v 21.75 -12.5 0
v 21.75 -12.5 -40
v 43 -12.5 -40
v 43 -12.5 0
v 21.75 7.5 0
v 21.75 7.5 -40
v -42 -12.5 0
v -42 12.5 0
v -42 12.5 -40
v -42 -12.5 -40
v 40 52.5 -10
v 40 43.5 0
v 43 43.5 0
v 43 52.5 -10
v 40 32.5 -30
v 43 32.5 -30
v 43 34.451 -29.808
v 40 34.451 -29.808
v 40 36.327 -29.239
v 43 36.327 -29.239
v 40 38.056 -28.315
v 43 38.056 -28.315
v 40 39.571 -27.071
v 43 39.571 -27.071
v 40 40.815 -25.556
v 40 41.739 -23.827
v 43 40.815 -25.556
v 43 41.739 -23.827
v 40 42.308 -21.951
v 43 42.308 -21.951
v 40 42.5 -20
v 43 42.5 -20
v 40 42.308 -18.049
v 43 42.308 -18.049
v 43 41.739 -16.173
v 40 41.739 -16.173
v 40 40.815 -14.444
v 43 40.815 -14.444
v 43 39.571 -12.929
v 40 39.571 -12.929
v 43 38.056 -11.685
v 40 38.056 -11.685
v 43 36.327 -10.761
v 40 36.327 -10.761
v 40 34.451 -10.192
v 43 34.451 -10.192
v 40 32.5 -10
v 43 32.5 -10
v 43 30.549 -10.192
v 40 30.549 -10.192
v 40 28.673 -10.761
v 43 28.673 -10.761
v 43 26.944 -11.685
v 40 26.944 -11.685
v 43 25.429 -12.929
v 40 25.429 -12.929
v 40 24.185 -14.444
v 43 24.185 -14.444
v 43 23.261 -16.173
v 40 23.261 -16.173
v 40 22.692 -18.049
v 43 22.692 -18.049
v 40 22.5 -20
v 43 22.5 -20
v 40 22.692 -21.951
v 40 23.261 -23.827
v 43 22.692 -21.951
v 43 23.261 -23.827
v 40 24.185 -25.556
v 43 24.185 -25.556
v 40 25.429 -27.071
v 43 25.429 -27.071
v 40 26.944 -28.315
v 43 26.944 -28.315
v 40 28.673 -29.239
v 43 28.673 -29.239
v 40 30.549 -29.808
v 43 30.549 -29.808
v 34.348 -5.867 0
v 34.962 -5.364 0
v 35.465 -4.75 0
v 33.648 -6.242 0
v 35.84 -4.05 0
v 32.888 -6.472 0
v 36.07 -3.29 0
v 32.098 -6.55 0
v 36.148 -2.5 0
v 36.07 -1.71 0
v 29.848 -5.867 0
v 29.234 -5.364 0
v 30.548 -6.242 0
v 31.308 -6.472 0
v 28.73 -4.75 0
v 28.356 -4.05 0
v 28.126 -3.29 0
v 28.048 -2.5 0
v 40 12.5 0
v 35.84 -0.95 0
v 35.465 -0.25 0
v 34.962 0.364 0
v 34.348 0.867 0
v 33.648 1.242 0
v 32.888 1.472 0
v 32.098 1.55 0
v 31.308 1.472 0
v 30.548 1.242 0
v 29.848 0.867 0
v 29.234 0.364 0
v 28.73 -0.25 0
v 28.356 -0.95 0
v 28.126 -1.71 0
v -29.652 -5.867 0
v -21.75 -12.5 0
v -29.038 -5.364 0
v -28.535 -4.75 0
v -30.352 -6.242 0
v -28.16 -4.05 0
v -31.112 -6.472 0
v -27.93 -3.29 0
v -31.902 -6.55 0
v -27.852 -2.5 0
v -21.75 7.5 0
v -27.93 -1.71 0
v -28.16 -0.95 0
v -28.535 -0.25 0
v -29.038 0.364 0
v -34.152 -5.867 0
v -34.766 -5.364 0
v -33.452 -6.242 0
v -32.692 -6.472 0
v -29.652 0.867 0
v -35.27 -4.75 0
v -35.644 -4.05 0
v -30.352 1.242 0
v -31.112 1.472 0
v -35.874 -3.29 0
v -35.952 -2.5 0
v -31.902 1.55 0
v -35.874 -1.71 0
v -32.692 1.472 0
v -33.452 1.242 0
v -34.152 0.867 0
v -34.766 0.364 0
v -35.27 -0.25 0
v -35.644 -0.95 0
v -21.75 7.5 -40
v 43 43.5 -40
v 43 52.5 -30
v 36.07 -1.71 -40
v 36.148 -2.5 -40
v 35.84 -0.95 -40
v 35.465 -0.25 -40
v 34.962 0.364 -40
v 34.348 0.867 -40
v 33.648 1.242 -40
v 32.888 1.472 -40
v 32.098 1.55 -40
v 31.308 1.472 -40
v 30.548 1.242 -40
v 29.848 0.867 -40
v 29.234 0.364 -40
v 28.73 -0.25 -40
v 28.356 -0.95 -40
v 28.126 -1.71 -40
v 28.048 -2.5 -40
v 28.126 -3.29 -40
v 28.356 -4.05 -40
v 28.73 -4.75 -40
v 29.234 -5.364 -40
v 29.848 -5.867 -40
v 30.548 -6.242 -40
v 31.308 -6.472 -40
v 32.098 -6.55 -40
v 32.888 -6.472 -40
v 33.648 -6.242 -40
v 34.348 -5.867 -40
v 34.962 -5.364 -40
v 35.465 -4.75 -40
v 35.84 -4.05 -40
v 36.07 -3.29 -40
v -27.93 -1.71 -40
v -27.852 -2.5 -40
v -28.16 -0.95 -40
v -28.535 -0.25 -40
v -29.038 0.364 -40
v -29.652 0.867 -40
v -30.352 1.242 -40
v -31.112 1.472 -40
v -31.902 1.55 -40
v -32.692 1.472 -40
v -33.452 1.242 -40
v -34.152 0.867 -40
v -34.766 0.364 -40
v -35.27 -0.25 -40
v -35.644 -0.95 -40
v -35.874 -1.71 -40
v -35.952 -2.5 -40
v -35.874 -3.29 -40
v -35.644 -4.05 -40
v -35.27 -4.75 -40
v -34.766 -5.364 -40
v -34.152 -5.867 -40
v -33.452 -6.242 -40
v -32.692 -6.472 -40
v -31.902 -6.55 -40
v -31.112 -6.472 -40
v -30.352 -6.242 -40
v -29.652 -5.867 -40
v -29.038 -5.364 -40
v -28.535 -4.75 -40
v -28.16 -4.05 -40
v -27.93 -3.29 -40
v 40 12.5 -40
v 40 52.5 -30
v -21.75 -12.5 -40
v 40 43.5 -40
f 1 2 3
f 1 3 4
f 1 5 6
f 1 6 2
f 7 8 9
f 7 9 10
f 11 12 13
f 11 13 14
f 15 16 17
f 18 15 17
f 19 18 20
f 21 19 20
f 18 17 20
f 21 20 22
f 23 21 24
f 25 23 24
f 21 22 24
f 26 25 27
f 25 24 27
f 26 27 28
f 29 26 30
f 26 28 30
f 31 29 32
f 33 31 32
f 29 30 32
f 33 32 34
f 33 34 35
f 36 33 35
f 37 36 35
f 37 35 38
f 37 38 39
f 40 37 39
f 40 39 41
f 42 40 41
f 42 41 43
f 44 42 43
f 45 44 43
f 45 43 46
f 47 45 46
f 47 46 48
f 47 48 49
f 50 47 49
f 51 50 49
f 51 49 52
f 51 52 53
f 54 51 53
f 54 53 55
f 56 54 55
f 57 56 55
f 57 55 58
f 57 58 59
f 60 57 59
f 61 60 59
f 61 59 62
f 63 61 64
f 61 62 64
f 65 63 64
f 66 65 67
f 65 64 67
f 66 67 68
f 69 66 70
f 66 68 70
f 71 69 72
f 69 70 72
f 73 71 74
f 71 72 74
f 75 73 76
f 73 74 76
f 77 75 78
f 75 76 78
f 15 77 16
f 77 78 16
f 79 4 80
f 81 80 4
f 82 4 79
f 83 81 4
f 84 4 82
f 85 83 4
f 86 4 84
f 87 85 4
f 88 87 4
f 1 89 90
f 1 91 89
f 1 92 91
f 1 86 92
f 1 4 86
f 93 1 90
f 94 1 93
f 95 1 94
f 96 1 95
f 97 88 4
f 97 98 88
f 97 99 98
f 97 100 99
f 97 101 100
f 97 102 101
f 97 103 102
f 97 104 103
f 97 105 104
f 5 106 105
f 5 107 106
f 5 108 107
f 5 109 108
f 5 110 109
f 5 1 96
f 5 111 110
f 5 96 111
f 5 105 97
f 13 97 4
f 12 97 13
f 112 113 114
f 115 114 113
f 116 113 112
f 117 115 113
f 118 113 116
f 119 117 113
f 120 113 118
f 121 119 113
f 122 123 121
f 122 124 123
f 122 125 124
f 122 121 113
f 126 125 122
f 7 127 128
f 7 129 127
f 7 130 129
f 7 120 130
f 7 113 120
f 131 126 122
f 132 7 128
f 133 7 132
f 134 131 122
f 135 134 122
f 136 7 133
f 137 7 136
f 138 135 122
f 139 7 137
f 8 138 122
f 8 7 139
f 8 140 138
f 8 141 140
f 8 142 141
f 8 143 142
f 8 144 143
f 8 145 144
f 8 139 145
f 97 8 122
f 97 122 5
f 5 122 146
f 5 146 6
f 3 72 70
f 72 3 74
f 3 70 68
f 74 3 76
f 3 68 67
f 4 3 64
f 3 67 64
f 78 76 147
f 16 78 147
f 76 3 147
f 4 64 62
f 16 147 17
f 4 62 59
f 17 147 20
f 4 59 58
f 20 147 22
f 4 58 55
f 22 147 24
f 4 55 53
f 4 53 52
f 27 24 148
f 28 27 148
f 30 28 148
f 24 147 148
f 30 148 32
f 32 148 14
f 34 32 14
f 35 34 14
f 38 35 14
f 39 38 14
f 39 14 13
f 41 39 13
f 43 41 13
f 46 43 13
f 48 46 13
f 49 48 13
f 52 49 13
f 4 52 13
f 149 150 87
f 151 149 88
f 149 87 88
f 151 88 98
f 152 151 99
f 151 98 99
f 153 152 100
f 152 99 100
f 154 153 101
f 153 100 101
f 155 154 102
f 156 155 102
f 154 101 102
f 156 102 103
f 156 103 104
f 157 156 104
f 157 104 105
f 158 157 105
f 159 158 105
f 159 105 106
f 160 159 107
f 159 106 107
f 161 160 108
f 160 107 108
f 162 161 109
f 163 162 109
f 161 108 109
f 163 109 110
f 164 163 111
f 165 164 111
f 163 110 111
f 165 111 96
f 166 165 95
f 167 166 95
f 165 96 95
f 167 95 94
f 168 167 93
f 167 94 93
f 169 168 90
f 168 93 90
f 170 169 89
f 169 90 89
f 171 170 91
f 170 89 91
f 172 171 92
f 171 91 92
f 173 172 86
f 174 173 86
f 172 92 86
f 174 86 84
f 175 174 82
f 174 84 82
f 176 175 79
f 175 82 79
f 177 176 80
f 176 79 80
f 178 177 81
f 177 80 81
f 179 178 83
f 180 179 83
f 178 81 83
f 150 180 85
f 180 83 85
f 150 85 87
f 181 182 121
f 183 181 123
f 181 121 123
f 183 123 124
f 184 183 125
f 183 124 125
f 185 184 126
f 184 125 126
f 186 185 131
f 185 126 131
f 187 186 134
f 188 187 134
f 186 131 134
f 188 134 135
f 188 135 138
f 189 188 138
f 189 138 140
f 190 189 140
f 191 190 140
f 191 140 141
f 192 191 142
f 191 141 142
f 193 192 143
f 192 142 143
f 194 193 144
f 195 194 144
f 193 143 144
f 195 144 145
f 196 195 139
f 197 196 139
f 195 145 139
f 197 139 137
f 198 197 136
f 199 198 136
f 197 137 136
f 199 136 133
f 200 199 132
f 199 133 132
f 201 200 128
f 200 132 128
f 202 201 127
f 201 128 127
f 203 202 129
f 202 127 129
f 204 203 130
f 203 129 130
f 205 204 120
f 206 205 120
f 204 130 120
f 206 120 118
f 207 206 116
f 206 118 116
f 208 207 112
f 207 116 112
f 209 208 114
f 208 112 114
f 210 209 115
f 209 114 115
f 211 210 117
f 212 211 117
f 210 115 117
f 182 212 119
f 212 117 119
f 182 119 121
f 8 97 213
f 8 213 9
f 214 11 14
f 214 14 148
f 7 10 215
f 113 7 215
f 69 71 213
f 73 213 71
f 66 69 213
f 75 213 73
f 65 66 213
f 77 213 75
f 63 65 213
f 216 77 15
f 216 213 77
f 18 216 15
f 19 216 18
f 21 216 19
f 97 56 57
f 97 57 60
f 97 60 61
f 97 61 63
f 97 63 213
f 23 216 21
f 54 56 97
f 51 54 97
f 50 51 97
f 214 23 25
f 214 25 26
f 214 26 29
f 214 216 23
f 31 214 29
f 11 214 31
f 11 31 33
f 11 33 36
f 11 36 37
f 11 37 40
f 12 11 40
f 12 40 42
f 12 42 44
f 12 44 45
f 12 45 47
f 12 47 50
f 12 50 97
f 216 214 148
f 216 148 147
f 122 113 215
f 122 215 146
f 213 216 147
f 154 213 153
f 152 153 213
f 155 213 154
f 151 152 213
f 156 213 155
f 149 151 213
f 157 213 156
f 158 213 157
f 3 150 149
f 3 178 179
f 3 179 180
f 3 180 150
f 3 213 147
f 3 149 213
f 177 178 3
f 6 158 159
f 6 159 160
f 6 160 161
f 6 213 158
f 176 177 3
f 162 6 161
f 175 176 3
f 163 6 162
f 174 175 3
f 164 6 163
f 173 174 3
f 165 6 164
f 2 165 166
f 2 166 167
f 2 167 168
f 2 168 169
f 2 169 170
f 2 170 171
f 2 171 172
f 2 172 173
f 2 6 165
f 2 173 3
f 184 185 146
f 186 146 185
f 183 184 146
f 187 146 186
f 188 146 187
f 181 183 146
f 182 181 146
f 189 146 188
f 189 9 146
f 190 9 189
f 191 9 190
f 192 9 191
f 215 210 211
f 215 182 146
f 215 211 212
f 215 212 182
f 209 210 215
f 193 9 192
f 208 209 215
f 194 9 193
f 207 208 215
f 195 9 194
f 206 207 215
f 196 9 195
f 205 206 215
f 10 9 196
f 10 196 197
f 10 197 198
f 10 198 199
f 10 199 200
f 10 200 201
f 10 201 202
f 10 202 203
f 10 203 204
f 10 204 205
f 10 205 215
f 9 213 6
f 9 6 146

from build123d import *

# Parameters (mm, degrees)
CROQUIS1_R              = 4.05
SALIENTE_EXTRUIR2_DEPTH = 40
SALIENTE_EXTRUIR3_DEPTH = 3
CROQUIS4_R              = 10
CORTAR_EXTRUIR2_DEPTH   = 86


with BuildPart() as part:
    # Croquis1 → Saliente-Extruir2 (new body)
    with BuildSketch(Plane.XY):
        Polygon((42, 12.5), (-42, 12.5), (-42, -12.5), (-21.75, -12.5), (-21.75, 7.5), (21.75, 7.5), (21.75, -12.5), (42, -12.5), align=None)
        with Locations((-31.902194282, -2.5)):
            Circle(CROQUIS1_R, mode=Mode.SUBTRACT)
        with Locations((32.097805718, -2.5)):
            Circle(CROQUIS1_R, mode=Mode.SUBTRACT)
    extrude(amount=-SALIENTE_EXTRUIR2_DEPTH)

    # Croquis3 → Saliente-Extruir3 (add)
    with BuildSketch(Plane(origin=(40, 0, 0), x_dir=(0, 0, -1), z_dir=(1, 0, 0))):
        Polygon((30, 52.5), (40, 43.5), (40, -12.5), (0, -12.5), (0, 43.5), (10, 52.5), align=None)
    extrude(amount=SALIENTE_EXTRUIR3_DEPTH)

    # Croquis4 → Cortar-Extruir2 (cut, through all)
    with BuildSketch(Plane(origin=(43, 0, 0), x_dir=(0, 0, -1), z_dir=(1, 0, 0))):
        with Locations((20, 32.5)):
            Circle(CROQUIS4_R)
    extrude(amount=-CORTAR_EXTRUIR2_DEPTH, mode=Mode.SUBTRACT)


solid = part.part
